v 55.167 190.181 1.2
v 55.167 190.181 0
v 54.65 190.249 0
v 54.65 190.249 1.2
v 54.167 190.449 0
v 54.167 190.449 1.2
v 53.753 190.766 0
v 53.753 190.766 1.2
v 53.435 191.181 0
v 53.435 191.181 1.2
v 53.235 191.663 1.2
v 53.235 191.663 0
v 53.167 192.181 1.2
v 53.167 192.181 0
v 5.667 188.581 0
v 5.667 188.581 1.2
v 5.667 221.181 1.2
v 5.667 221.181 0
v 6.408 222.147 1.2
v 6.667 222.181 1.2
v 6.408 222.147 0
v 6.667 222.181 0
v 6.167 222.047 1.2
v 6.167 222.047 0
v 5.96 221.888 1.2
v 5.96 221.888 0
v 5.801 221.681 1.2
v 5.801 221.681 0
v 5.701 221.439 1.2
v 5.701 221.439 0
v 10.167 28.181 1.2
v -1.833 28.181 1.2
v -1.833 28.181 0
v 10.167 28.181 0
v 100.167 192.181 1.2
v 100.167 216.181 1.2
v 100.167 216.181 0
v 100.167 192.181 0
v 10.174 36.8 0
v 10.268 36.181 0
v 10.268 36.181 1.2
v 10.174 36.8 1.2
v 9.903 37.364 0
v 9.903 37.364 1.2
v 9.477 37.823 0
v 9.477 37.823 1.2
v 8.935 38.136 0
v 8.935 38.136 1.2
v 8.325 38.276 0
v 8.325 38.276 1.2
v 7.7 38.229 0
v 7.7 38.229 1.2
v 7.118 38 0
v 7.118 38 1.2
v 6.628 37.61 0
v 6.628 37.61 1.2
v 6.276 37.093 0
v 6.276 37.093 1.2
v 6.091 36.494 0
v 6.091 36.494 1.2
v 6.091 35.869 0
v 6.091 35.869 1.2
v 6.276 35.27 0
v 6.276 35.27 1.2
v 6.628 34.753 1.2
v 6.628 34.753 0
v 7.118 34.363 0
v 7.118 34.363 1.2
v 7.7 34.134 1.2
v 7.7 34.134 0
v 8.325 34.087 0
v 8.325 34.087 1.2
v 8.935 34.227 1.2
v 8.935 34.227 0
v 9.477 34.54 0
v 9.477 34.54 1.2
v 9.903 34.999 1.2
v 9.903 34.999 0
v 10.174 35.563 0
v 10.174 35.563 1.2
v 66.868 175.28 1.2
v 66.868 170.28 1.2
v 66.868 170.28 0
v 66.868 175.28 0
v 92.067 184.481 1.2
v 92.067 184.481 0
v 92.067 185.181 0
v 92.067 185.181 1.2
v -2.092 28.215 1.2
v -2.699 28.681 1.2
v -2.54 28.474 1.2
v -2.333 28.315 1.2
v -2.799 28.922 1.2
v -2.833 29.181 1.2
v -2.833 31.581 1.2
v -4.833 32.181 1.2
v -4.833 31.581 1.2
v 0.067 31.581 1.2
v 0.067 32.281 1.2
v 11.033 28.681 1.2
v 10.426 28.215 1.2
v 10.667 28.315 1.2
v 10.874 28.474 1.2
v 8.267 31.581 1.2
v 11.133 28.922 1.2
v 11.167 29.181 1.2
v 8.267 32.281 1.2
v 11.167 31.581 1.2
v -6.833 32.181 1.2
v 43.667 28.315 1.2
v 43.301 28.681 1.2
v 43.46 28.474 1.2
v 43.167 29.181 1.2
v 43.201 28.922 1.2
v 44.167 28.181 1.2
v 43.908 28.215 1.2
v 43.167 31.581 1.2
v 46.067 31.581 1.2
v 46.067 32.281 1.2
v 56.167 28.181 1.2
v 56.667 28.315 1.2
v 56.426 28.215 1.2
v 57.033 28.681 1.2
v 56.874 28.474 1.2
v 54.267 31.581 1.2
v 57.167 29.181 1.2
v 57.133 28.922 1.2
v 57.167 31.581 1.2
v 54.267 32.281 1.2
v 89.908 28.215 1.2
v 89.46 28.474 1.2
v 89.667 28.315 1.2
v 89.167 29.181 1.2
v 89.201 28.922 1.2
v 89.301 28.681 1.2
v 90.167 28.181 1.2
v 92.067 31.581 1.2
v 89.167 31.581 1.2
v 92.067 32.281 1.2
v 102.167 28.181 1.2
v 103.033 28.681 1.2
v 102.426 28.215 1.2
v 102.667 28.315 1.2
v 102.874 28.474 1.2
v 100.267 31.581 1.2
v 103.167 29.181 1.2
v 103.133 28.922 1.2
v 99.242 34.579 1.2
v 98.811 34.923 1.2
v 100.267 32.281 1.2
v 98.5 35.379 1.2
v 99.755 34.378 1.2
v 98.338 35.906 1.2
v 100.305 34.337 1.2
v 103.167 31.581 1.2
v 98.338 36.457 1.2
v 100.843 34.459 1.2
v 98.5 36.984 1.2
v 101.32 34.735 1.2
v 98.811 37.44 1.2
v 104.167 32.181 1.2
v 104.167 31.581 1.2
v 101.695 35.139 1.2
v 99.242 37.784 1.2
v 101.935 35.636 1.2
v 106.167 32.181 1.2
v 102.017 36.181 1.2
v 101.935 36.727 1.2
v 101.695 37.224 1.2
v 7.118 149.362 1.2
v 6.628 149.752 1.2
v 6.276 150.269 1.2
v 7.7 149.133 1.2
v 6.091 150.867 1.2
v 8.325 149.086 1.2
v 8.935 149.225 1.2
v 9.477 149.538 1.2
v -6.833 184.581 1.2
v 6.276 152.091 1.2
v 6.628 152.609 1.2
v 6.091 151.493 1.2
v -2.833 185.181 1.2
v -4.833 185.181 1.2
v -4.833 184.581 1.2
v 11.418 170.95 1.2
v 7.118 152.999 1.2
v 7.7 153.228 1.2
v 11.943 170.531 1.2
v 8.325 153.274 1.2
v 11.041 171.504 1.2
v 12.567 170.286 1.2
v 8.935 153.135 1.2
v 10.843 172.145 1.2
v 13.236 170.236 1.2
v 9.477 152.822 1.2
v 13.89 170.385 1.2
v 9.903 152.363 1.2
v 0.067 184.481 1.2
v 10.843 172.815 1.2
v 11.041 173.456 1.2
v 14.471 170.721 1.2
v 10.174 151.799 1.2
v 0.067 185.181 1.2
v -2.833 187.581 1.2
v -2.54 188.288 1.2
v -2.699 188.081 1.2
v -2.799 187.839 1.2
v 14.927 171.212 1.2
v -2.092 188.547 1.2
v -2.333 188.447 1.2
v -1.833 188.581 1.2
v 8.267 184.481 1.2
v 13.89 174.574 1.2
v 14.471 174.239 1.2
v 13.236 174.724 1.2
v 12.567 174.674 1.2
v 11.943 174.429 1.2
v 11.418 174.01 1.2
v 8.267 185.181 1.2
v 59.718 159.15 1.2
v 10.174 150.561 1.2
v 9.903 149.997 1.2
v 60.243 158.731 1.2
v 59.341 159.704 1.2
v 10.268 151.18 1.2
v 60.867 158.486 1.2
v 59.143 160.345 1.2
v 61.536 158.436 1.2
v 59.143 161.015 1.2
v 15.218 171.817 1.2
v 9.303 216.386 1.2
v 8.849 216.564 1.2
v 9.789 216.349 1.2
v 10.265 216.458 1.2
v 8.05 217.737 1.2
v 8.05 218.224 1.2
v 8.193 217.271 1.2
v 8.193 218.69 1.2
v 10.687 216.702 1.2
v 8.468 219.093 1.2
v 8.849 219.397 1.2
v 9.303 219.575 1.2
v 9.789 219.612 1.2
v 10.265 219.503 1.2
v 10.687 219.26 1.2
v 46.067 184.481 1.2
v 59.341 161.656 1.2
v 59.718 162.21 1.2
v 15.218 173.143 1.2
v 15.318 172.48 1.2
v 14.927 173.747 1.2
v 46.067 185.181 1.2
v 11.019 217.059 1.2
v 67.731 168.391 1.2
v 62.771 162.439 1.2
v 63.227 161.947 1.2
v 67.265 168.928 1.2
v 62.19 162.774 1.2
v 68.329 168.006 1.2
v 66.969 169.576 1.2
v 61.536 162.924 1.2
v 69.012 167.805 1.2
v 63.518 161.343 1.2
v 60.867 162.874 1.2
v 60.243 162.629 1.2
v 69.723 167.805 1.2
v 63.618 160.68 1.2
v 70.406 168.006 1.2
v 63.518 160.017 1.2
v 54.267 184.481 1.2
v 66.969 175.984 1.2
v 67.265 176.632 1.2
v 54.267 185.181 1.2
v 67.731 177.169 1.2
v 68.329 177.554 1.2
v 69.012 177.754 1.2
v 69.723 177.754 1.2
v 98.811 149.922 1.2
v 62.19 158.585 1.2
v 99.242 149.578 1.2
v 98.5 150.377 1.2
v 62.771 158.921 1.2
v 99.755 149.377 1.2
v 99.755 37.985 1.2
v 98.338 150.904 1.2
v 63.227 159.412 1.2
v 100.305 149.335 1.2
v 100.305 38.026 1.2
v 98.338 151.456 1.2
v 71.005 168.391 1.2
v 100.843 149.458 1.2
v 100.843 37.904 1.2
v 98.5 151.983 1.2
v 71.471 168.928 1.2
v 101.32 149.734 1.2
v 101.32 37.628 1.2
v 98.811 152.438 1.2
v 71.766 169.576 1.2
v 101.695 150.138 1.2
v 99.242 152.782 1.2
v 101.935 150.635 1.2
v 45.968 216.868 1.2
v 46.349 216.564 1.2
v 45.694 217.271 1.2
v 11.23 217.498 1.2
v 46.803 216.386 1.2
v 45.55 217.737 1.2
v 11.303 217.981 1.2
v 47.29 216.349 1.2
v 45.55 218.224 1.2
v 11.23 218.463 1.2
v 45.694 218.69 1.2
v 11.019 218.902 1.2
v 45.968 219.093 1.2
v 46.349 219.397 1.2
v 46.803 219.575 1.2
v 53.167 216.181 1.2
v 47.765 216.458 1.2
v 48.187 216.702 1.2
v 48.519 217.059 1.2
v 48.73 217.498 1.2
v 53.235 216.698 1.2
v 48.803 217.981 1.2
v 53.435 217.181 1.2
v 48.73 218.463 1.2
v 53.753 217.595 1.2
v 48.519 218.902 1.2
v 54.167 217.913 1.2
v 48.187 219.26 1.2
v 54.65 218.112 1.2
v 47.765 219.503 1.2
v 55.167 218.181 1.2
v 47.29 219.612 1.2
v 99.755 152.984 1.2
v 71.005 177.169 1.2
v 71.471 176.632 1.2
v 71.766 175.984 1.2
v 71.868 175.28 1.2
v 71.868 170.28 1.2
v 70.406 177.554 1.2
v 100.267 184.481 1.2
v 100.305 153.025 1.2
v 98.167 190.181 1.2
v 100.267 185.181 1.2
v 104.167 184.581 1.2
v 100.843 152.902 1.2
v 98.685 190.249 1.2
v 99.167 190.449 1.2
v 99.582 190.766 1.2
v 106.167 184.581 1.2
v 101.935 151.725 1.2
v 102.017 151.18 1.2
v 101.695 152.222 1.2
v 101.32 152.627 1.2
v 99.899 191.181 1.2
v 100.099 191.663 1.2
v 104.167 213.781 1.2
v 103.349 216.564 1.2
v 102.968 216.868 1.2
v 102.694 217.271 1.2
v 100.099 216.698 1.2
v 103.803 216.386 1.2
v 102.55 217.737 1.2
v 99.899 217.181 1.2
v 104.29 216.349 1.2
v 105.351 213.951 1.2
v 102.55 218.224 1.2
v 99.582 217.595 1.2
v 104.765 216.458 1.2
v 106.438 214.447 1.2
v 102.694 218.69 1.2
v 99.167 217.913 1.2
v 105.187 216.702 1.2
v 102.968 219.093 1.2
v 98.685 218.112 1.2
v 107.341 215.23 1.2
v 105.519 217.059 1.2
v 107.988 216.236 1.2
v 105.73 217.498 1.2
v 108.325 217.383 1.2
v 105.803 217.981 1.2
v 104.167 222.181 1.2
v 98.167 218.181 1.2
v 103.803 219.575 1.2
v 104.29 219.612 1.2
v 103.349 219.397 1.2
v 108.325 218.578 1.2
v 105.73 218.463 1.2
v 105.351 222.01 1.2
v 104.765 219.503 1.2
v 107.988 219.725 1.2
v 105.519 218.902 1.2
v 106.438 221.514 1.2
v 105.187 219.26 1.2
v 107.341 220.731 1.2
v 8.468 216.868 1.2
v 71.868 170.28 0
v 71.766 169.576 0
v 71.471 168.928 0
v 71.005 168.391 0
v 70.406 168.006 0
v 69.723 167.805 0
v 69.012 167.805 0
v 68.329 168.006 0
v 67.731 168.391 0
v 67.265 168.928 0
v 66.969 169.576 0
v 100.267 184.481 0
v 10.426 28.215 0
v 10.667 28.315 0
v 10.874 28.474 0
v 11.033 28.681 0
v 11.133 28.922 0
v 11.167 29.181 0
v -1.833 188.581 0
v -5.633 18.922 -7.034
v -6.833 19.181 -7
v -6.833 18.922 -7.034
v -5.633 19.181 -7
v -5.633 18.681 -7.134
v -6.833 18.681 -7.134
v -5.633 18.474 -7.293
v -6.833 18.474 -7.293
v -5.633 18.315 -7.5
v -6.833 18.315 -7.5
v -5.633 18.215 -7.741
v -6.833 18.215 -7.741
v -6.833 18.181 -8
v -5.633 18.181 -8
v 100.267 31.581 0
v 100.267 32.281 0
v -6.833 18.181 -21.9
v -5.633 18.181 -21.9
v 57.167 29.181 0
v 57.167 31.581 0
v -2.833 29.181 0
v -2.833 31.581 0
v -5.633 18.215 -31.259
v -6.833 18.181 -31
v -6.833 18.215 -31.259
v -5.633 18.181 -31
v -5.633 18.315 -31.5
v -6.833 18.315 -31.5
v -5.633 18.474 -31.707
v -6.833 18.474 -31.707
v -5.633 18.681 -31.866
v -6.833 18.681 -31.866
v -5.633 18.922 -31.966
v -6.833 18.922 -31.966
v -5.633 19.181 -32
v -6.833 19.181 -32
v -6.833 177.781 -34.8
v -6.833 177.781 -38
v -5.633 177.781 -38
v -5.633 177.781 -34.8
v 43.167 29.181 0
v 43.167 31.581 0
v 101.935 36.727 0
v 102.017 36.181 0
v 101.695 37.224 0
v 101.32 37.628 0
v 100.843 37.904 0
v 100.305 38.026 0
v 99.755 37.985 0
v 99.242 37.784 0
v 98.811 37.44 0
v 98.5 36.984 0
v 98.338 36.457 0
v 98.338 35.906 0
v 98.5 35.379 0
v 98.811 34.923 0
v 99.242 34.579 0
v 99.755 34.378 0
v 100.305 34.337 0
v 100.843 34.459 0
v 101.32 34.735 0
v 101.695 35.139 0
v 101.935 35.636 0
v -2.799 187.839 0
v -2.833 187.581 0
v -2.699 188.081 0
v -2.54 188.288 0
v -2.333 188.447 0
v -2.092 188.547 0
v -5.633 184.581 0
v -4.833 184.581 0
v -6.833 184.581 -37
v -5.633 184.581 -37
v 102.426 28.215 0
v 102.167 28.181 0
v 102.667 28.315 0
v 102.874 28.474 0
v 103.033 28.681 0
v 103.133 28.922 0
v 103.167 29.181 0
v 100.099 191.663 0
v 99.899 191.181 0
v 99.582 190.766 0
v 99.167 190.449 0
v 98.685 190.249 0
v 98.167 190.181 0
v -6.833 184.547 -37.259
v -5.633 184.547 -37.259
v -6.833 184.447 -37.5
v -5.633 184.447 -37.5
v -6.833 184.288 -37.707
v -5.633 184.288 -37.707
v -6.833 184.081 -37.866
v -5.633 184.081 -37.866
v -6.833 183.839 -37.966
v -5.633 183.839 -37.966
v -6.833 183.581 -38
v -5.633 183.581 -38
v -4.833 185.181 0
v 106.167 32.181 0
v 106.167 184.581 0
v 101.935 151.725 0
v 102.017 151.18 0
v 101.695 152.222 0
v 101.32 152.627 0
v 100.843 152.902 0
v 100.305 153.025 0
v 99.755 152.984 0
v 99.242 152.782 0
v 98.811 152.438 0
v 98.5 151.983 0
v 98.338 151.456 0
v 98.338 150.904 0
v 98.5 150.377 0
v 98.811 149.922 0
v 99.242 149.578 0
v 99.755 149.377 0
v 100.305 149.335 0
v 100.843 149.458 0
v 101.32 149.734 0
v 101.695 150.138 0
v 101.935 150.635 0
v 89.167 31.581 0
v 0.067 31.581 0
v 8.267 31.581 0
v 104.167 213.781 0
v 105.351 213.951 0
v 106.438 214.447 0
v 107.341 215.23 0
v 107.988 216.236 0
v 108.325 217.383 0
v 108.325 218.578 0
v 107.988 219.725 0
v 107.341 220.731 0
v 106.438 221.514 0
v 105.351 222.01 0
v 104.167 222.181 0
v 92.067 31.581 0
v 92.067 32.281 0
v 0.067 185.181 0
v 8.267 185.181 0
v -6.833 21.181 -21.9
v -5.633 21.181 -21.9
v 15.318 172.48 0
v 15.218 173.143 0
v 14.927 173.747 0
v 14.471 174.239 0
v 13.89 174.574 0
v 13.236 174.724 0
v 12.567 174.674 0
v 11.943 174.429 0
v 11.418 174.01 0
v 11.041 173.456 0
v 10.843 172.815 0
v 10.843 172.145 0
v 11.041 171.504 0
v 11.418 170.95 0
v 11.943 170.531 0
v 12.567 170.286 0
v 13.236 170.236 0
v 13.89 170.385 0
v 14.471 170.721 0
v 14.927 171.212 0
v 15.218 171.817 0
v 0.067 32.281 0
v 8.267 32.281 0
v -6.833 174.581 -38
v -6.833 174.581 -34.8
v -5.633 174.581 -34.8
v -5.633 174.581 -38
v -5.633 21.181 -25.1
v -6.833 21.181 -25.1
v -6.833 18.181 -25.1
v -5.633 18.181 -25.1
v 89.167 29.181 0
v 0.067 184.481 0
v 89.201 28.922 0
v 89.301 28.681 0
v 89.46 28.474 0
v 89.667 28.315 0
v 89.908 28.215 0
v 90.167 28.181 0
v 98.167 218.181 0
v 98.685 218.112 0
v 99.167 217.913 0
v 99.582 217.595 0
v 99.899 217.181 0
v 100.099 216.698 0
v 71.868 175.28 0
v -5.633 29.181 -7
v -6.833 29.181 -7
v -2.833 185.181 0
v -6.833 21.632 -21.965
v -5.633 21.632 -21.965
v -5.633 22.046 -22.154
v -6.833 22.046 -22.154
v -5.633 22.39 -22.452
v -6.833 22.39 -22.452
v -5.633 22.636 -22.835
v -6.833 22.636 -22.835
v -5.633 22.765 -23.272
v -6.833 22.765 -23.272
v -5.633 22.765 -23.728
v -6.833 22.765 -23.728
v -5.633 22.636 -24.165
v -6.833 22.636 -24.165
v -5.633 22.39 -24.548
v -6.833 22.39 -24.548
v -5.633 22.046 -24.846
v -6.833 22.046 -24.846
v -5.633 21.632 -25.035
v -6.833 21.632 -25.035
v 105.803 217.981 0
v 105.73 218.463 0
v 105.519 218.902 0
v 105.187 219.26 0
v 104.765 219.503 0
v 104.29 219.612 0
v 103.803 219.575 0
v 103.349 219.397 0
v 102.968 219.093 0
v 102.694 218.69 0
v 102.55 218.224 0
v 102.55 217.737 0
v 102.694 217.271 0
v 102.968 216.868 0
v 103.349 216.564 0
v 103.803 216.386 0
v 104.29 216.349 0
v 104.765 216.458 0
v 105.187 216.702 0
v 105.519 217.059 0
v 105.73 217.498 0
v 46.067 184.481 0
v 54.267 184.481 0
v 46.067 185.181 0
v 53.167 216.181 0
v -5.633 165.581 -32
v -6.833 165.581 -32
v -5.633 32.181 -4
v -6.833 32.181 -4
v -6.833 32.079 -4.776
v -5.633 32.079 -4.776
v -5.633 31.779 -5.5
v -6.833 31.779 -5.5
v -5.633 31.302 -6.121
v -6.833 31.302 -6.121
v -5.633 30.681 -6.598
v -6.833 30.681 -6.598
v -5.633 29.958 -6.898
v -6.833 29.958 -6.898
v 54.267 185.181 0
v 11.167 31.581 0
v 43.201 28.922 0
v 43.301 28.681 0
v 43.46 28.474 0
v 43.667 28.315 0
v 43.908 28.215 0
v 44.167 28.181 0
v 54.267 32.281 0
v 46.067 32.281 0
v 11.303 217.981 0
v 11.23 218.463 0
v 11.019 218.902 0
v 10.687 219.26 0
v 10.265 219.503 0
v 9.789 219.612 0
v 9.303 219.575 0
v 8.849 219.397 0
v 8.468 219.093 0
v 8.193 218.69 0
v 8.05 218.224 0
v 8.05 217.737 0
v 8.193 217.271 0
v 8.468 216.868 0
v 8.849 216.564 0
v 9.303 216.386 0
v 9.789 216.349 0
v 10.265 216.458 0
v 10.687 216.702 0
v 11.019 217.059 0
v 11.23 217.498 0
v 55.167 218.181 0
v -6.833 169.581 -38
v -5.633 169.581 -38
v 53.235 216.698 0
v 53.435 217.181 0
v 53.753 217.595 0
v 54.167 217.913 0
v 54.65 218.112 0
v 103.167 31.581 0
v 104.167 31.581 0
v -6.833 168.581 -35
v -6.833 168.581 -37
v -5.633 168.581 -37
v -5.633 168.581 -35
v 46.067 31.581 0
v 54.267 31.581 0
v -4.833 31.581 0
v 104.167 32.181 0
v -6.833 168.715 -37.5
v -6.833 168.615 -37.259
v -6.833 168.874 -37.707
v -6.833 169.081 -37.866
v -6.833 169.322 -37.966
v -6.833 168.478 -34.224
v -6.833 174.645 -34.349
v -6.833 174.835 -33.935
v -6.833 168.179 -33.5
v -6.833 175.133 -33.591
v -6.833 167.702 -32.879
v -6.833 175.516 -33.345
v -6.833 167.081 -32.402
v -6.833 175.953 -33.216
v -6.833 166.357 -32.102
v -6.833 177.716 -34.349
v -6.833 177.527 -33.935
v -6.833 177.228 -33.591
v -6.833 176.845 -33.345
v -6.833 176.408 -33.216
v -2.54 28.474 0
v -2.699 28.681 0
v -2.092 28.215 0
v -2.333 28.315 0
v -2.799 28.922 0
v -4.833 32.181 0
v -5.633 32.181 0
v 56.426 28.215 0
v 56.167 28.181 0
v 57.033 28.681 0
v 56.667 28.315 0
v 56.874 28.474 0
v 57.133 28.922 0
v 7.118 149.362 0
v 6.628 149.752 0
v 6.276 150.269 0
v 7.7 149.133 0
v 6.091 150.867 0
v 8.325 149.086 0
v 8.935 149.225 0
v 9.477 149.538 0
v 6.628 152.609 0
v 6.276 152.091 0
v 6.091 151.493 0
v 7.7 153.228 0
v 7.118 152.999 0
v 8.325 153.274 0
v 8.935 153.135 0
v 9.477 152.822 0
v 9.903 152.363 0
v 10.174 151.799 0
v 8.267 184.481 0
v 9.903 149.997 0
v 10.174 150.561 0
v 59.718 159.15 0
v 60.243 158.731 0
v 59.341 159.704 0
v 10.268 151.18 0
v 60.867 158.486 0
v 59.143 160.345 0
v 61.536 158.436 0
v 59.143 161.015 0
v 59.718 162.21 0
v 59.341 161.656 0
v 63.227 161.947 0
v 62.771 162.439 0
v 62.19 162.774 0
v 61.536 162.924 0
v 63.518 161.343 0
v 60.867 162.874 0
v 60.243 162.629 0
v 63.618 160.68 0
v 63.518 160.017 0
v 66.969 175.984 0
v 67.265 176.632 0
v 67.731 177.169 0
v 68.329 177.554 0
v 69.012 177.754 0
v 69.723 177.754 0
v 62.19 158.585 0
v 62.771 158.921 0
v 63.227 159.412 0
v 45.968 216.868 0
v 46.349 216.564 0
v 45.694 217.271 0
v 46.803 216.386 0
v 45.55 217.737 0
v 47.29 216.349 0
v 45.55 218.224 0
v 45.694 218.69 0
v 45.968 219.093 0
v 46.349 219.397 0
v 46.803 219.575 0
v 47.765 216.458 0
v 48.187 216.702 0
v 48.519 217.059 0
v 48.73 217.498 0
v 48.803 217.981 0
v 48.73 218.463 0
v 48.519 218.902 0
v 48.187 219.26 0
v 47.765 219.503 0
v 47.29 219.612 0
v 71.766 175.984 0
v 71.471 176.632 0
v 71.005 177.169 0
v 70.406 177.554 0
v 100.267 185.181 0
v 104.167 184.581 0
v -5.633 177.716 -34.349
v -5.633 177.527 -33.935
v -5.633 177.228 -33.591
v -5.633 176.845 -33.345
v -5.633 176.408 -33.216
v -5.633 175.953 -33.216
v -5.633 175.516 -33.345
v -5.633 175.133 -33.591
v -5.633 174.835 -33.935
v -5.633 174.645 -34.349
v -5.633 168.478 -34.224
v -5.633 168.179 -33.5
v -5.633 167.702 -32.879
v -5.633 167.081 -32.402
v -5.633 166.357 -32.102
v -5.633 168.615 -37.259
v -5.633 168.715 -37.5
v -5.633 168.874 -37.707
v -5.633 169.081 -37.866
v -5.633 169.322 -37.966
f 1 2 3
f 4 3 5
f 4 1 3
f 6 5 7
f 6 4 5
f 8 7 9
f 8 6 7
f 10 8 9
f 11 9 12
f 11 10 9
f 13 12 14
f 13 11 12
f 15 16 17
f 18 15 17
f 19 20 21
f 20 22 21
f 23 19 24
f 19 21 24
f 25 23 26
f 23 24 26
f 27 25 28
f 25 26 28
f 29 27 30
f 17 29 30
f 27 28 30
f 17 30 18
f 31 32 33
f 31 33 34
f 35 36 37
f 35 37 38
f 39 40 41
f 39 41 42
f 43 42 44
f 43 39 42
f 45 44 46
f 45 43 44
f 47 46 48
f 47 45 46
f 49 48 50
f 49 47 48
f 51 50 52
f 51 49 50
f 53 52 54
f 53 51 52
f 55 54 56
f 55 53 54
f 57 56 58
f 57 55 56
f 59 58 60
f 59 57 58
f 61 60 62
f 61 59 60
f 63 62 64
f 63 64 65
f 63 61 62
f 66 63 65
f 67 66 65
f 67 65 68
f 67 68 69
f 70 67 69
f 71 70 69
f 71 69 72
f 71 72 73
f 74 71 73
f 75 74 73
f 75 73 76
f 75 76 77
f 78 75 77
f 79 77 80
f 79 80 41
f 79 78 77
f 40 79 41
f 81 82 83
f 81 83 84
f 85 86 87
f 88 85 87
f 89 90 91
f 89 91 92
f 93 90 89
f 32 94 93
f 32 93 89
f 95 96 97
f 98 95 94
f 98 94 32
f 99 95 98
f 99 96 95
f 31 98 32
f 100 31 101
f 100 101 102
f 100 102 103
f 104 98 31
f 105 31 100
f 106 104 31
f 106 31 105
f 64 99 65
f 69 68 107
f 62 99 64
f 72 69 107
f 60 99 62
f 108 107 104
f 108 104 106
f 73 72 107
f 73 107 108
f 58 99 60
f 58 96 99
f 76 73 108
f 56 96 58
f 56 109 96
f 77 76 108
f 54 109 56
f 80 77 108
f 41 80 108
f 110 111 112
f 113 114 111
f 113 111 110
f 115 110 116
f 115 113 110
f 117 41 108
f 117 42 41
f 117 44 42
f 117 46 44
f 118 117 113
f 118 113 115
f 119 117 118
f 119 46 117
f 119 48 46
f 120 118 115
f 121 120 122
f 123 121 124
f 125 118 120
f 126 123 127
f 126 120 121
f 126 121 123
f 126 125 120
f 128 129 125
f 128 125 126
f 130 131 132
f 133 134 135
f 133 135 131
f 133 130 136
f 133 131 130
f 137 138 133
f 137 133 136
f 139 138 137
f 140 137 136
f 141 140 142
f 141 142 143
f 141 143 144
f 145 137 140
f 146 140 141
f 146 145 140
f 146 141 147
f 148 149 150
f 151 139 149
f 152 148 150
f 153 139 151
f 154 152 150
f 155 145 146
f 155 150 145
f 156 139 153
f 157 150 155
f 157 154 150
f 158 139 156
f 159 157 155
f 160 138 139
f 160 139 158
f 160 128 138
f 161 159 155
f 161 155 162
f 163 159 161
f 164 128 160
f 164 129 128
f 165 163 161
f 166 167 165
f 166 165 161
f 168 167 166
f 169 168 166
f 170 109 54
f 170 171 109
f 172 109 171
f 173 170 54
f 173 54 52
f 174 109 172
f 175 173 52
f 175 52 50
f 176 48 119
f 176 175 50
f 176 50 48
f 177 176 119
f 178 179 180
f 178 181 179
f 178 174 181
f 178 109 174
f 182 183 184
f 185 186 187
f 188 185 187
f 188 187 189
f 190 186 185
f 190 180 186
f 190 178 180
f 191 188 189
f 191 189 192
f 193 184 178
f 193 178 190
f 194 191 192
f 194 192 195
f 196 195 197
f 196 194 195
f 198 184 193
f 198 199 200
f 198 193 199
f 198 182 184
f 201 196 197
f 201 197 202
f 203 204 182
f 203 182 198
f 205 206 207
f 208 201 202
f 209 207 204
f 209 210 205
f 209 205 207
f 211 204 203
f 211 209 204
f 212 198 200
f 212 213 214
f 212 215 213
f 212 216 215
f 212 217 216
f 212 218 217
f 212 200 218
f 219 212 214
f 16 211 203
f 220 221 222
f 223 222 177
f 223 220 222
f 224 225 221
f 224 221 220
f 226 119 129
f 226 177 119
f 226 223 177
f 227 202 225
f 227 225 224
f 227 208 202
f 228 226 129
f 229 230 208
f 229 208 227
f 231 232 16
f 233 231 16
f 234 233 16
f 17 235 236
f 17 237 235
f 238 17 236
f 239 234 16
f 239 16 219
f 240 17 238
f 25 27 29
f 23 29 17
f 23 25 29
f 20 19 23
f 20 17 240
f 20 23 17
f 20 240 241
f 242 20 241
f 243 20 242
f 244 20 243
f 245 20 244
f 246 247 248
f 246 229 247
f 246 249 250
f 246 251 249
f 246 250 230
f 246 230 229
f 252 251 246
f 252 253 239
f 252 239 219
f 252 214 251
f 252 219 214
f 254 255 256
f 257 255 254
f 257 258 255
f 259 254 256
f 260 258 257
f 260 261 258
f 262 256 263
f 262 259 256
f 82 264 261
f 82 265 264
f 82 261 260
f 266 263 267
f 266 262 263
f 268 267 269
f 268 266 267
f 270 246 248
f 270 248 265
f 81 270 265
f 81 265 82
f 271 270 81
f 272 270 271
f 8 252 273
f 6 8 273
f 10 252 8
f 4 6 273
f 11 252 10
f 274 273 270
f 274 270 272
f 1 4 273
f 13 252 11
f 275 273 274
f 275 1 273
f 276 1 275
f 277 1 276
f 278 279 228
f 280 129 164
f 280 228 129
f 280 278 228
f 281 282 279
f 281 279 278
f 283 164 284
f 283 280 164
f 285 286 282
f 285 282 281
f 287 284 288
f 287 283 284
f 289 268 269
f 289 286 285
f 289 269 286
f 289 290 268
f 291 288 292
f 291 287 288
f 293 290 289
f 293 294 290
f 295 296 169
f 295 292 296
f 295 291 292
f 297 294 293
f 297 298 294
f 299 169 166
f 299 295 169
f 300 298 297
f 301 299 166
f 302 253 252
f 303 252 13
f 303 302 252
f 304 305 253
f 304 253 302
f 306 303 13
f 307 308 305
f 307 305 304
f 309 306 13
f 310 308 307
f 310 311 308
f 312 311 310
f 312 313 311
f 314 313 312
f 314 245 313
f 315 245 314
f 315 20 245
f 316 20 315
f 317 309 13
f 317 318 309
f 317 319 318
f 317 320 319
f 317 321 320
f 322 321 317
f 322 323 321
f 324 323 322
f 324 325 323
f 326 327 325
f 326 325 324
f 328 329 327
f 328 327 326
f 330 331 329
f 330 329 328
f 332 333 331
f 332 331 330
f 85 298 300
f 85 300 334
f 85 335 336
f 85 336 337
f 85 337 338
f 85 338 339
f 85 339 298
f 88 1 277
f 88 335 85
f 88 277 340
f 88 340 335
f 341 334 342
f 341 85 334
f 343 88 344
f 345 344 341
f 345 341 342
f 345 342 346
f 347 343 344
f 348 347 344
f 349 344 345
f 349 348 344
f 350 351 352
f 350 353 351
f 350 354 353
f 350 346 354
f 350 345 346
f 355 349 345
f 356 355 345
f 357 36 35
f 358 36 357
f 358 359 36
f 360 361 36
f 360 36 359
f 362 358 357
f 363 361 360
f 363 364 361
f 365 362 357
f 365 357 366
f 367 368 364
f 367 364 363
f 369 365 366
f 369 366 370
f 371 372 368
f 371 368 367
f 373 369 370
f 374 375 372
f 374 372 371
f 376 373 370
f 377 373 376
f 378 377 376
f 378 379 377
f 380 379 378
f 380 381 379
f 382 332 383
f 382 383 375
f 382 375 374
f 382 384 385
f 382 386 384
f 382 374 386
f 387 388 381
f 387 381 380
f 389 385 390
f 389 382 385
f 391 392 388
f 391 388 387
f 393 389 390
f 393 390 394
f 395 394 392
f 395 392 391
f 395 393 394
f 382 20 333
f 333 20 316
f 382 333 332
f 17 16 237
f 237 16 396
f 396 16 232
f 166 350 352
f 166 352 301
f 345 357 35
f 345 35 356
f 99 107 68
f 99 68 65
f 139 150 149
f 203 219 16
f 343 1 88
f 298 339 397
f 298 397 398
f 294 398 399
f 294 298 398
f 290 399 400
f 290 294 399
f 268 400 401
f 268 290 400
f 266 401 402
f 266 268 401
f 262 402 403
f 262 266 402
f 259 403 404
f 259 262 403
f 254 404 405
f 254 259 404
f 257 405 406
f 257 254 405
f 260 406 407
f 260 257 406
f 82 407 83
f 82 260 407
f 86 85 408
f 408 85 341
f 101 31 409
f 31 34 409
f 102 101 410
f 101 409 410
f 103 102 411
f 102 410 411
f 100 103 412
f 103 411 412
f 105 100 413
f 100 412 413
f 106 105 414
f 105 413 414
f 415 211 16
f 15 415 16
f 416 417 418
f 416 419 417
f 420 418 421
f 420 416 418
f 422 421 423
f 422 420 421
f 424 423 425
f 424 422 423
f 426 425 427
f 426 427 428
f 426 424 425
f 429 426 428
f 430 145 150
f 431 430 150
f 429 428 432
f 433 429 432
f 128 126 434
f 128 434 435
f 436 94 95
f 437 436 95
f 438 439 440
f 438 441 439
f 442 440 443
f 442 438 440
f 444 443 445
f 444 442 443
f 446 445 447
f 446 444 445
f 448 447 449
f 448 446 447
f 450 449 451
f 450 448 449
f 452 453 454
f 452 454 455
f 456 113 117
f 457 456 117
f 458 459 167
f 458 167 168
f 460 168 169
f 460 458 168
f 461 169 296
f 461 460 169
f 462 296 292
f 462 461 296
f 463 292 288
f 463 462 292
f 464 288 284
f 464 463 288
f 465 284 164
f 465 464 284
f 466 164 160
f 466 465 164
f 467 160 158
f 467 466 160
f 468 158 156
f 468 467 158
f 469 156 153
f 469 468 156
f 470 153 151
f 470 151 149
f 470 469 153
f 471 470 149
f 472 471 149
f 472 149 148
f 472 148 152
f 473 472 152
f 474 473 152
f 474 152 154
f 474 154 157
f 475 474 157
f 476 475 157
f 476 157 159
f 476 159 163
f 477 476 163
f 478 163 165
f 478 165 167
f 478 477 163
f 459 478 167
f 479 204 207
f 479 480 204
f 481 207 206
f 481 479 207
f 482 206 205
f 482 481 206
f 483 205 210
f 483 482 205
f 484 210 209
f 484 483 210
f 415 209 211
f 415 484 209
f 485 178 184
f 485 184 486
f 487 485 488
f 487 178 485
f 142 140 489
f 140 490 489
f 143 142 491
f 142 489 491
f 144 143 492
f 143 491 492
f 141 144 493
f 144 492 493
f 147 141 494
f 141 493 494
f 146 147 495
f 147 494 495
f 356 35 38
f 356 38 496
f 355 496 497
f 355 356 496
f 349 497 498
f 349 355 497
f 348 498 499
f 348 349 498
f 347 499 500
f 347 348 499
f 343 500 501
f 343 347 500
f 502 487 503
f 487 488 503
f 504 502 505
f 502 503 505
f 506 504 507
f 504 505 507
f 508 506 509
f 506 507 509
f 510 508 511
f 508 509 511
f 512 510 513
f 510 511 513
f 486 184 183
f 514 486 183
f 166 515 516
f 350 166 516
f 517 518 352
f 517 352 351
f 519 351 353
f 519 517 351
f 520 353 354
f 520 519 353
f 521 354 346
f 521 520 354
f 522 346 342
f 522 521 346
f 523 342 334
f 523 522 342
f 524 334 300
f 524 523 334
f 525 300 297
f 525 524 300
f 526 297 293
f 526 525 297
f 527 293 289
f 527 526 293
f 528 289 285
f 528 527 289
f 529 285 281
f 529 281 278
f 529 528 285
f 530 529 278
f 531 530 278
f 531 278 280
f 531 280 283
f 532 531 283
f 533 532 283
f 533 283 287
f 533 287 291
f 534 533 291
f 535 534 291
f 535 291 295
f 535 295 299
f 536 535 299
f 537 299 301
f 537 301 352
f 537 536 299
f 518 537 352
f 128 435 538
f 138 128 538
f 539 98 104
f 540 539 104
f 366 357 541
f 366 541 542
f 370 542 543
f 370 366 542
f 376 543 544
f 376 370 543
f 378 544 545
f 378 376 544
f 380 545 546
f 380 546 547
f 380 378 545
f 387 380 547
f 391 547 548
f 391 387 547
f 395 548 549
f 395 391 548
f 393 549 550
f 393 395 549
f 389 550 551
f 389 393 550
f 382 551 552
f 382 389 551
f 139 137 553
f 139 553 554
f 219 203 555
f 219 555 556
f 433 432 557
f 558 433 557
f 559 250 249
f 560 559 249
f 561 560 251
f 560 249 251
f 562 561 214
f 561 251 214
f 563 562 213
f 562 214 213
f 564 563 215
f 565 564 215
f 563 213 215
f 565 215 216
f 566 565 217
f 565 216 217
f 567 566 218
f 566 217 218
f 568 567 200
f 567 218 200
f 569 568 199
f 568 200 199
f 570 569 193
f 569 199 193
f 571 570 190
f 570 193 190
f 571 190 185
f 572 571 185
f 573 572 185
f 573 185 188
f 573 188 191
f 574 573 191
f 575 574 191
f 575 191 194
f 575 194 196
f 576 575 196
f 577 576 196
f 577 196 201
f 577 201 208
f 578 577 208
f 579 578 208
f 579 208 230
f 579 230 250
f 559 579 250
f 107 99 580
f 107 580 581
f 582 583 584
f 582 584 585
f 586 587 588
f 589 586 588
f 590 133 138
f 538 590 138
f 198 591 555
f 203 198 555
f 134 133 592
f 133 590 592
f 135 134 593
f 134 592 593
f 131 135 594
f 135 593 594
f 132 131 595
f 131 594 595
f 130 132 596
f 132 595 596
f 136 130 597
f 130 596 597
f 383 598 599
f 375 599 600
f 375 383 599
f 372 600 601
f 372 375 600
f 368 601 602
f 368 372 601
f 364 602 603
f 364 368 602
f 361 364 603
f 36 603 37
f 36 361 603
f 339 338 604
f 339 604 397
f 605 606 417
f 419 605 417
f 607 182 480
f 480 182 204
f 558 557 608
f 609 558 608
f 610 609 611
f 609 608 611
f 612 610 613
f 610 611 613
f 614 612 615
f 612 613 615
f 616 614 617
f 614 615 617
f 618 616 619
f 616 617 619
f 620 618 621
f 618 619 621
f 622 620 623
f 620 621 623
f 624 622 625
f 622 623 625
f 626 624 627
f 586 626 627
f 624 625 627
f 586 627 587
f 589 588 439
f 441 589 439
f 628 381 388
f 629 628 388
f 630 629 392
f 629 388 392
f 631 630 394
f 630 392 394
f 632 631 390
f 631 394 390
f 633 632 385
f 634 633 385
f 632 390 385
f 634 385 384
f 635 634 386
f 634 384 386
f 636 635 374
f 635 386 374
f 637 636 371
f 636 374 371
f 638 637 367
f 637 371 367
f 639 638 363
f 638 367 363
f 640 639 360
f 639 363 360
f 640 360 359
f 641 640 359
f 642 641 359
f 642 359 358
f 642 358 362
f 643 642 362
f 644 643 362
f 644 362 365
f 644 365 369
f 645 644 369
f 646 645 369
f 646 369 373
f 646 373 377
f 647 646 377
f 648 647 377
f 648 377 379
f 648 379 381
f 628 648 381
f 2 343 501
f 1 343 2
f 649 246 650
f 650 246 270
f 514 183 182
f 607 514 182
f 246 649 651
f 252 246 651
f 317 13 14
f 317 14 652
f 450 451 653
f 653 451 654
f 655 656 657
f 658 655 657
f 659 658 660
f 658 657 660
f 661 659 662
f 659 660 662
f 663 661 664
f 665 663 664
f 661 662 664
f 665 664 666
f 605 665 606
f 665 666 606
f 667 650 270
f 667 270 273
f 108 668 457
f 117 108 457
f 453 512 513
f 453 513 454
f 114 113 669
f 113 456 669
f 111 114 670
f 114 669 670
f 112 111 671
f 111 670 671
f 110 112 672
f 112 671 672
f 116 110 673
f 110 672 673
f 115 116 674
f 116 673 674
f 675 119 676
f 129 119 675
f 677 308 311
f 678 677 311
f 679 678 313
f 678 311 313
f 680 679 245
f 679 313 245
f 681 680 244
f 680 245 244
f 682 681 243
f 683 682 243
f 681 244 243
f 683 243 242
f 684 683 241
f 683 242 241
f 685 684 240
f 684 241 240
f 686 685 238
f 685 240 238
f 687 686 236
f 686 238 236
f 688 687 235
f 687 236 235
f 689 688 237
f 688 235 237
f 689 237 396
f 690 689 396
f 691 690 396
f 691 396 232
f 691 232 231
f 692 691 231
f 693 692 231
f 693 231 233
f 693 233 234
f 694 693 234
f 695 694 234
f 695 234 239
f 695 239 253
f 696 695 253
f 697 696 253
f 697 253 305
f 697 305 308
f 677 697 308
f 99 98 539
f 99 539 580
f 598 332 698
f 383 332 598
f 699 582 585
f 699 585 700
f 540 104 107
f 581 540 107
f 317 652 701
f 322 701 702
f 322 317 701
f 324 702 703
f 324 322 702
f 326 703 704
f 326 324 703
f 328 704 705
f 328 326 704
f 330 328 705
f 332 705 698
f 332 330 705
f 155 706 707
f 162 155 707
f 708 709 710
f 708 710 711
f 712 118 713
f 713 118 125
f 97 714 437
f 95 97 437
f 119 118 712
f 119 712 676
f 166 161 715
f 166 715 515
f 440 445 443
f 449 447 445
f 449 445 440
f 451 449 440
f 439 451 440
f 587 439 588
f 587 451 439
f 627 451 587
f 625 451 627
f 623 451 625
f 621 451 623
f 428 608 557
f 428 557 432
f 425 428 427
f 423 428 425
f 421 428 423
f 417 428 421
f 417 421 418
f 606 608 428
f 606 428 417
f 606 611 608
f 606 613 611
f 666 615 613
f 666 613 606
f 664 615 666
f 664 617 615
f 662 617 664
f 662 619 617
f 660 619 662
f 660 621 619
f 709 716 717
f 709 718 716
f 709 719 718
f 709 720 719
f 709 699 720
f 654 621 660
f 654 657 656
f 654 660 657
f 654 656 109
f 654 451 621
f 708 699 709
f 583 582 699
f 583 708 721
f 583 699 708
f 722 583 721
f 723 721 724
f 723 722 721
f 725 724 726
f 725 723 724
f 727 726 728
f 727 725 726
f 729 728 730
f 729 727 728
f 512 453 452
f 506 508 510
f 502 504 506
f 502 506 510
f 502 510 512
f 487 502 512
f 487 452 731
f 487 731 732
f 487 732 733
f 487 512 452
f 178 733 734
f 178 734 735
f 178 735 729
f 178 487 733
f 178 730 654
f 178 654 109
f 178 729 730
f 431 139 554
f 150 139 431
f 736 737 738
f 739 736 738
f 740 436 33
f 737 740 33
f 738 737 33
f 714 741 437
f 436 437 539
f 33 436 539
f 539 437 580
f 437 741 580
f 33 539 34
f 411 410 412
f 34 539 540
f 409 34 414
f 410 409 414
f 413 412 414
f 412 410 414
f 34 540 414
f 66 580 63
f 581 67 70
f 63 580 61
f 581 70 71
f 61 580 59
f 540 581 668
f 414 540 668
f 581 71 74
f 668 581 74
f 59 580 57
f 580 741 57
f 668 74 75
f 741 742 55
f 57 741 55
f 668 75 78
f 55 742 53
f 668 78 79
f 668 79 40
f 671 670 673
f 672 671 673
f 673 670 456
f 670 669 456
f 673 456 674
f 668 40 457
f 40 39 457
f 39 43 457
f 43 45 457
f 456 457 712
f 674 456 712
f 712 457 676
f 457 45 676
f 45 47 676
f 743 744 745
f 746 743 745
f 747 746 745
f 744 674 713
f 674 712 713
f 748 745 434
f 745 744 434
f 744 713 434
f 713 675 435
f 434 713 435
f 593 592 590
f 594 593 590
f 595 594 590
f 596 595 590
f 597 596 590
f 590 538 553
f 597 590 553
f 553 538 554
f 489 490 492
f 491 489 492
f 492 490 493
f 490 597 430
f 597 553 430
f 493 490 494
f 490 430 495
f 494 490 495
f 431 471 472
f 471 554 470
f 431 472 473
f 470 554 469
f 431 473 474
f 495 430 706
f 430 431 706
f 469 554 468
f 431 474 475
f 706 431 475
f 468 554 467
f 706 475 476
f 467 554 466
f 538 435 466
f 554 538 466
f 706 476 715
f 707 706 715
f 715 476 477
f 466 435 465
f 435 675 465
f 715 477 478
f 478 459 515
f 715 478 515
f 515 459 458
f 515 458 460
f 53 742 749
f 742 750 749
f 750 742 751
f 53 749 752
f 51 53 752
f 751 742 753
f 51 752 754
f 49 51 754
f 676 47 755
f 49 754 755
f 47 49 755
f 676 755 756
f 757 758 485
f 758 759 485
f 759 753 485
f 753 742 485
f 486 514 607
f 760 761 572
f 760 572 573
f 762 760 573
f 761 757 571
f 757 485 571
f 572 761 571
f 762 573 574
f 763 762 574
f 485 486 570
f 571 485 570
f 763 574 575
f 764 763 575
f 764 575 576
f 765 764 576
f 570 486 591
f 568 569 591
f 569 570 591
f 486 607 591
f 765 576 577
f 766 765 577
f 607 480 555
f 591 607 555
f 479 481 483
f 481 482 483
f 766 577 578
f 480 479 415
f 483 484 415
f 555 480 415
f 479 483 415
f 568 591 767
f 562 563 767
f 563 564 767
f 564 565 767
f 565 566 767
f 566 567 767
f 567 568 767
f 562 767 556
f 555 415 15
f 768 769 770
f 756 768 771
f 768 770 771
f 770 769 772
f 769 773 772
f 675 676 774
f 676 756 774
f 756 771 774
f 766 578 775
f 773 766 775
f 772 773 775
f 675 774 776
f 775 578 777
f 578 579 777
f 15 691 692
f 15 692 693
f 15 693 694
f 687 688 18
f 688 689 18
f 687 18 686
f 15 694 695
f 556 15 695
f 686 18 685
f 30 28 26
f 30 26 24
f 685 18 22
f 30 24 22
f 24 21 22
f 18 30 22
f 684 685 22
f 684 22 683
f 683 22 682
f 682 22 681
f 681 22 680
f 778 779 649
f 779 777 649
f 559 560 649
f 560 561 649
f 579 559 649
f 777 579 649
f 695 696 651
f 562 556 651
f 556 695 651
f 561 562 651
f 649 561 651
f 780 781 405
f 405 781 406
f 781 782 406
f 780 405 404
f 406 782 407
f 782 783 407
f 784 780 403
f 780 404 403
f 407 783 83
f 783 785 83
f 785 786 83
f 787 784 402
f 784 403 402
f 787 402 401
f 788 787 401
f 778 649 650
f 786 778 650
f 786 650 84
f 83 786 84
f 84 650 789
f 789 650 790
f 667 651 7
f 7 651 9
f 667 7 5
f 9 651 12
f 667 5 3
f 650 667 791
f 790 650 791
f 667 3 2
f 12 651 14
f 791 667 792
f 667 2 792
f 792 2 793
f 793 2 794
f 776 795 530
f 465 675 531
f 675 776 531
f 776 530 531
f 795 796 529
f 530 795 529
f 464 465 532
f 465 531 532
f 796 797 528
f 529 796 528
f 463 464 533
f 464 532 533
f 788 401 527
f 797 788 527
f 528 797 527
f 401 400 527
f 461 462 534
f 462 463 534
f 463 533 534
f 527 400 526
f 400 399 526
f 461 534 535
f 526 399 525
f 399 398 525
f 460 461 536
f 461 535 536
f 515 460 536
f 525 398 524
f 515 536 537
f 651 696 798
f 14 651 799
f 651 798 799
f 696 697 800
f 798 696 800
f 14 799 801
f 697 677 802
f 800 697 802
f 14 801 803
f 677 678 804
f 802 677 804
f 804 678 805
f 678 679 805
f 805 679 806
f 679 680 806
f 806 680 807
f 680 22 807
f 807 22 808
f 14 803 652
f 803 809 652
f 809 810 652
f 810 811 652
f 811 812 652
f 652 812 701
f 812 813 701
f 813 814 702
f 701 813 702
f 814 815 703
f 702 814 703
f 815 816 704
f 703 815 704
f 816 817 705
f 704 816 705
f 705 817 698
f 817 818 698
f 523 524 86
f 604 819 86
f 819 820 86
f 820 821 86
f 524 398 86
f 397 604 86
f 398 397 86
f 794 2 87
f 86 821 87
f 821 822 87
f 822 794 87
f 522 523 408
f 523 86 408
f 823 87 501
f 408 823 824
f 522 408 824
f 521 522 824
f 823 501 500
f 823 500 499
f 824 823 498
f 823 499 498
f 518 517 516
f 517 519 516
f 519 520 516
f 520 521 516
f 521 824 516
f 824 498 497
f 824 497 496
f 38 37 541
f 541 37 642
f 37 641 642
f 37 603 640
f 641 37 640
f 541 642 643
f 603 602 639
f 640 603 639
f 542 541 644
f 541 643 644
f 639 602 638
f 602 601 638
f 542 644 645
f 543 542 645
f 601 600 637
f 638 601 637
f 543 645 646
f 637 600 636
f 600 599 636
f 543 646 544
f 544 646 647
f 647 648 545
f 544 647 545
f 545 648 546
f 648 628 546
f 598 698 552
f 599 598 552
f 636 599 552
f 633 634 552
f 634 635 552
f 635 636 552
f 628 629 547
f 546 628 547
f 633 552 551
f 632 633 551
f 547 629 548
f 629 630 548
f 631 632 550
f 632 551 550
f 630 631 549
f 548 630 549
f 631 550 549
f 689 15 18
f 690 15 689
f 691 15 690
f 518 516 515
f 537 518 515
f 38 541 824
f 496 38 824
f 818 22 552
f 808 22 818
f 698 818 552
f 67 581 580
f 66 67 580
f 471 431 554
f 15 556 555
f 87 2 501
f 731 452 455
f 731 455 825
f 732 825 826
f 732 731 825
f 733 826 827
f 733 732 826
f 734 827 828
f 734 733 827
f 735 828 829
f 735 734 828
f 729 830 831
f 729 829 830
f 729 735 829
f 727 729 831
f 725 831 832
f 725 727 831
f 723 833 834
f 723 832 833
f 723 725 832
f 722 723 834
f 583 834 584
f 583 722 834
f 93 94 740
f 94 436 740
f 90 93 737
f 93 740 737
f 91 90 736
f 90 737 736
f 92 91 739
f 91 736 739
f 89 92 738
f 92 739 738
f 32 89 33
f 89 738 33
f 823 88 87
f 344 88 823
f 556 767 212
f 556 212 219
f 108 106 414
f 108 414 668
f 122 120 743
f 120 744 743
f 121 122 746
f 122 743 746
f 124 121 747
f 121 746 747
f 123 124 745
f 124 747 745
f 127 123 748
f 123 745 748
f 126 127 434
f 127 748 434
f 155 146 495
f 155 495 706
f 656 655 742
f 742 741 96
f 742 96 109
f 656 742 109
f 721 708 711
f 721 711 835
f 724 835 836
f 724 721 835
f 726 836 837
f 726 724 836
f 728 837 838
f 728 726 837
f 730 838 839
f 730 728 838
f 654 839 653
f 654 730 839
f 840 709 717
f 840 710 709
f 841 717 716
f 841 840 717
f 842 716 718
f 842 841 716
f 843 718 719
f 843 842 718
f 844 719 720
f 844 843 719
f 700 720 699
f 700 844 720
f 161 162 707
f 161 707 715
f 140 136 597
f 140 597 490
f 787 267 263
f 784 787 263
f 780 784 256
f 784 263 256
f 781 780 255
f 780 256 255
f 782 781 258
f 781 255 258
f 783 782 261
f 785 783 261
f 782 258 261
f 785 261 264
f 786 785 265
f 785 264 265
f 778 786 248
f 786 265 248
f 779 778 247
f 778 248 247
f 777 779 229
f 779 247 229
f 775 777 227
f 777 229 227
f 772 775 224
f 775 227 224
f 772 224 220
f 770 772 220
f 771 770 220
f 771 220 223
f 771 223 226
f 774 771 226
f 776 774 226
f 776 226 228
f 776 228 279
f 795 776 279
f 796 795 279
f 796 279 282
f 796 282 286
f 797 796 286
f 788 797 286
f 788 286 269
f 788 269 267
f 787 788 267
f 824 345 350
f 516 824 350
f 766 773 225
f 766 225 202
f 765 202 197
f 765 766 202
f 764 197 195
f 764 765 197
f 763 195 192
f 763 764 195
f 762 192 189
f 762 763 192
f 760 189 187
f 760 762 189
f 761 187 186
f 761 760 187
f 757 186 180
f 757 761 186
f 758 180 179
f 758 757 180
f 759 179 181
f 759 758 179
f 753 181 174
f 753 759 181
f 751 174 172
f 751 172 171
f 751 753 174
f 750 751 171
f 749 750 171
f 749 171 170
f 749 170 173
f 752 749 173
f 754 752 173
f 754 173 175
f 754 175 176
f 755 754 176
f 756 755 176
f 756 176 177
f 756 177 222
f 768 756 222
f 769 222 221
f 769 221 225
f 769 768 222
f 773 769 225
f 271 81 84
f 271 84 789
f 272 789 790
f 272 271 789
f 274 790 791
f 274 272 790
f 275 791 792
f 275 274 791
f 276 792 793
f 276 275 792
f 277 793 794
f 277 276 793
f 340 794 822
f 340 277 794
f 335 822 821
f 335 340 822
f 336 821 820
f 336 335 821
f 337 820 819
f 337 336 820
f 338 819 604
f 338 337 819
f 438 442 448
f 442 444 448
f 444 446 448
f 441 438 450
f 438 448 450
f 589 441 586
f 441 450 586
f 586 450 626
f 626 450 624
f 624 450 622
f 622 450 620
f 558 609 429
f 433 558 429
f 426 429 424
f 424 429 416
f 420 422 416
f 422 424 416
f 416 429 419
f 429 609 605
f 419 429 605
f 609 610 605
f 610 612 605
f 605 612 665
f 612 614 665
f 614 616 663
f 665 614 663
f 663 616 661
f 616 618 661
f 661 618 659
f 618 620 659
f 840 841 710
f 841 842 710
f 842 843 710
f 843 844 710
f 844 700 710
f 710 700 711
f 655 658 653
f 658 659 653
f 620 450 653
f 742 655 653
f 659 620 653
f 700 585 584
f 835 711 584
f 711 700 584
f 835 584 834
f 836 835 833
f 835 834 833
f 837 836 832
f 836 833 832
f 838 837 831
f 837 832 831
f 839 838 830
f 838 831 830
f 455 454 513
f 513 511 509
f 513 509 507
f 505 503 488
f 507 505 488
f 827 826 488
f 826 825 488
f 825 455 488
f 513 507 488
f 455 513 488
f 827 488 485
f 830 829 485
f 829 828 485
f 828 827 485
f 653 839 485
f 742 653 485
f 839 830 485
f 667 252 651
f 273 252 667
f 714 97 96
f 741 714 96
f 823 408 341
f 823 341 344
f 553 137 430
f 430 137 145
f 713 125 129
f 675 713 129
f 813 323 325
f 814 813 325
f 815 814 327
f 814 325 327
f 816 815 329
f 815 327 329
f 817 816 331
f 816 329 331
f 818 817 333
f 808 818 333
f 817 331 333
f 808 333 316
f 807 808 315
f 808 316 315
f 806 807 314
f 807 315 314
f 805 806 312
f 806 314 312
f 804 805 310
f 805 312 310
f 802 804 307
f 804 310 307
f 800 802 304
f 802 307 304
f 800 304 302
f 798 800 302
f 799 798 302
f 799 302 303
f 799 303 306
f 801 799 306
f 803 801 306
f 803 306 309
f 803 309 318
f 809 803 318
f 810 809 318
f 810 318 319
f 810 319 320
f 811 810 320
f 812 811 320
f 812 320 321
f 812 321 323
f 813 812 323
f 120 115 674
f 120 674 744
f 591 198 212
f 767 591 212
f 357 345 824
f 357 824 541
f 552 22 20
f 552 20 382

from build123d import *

# Parameters (mm, degrees)
SKETCH2_W           = 113.00010125
SKETCH2_H           = 190.5995575
SKETCH2_R           = 2.1
SKETCH2_R_2         = 1.85
BOSS_EXTRUDE1_DEPTH = 1.2
SKETCH5_W           = 2
SKETCH5_H           = 37.6
SKETCH5_H_2         = 0.6
CUT_EXTRUDE2_DEPTH  = 2.2
CUT_EXTRUDE1_DEPTH  = 2.2
SKETCH9_W           = 14
SKETCH9_H           = 3.4
SKETCH9_W_2         = 8.5
BOSS_EXTRUDE5_DEPTH = 1.2
FILLET1_R           = 1
CUT_EXTRUDE4_REACH  = 3.2
SKETCH10_W          = 8.2
SKETCH10_H          = 0.7
SKETCH11_R          = 2.25
CUT_EXTRUDE5_DEPTH  = 2.2
BOSS_EXTRUDE6_DEPTH = 1.2
SKETCH13_R          = 1.635773904
CUT_EXTRUDE6_DEPTH  = 2.2
SKETCH14_W          = 1.2
SKETCH14_H          = 152.3995575
BOSS_EXTRUDE7_DEPTH = 32
BOSS_EXTRUDE8_DEPTH = 1.2
BOSS_EXTRUDE9_DEPTH = 1.2
CUT_EXTRUDE7_REACH  = 117.2
FILLET2_R           = 1


with BuildPart() as part:
    # Sketch2 → Boss-Extrude1 (new body)
    with BuildSketch(Plane.XY):
        with Locations((49.667238625, 126.88082875)):
            Rectangle(SKETCH2_W, SKETCH2_H)
        with Locations((8.16763175, 151.180160625)):
            Circle(SKETCH2_R, mode=Mode.SUBTRACT)
        with Locations((100.1668405, 151.180160625)):
            Circle(SKETCH2_R_2, mode=Mode.SUBTRACT)
        with Locations((100.1668405, 36.181495)):
            Circle(SKETCH2_R_2, mode=Mode.SUBTRACT)
        with Locations((8.16763175, 36.181495)):
            Circle(SKETCH2_R, mode=Mode.SUBTRACT)
    extrude(amount=BOSS_EXTRUDE1_DEPTH)

    # Sketch5 → Cut-Extrude2 (cut, through all)
    with BuildSketch(Plane.XY.offset(1.2)):
        Polygon((-4.832812, 185.1806075), (5.667188, 185.1806075), (5.667188, 222.1806075), (-6.832812, 222.1806075), (-6.832812, 185.1806075), (-6.832812, 184.5806075), (-4.832812, 184.5806075), align=None)
        with Locations((105.16728925, 203.3806075)):
            Rectangle(SKETCH5_W, SKETCH5_H)
        with Locations((-5.832812, 31.88105)):
            Rectangle(SKETCH5_W, SKETCH5_H_2)
        with Locations((105.16728925, 31.88105)):
            Rectangle(SKETCH5_W, SKETCH5_H_2)
    extrude(amount=-CUT_EXTRUDE2_DEPTH, mode=Mode.SUBTRACT)

    # Sketch4 → Cut-Extrude1 (cut, through all)
    with BuildSketch(Plane.XY.offset(1.2)):
        with BuildLine():
            Line((55.16728925, 218.1806075), (98.16728925, 218.1806075))
            ThreePointArc((98.16728925, 218.1806075), (99.581502812, 217.594821062), (100.16728925, 216.1806075))
            Line((100.16728925, 216.1806075), (100.16728925, 192.1806075))
            ThreePointArc((100.16728925, 192.1806075), (99.581502812, 190.766393938), (98.16728925, 190.1806075))
            Line((98.16728925, 190.1806075), (55.16728925, 190.1806075))
            ThreePointArc((55.16728925, 190.1806075), (53.753075688, 190.766393938), (53.16728925, 192.1806075))
            Line((53.16728925, 192.1806075), (53.16728925, 216.1806075))
            ThreePointArc((53.16728925, 216.1806075), (53.753075688, 217.594821062), (55.16728925, 218.1806075))
        make_face()
    extrude(amount=-CUT_EXTRUDE1_DEPTH, mode=Mode.SUBTRACT)

    # Sketch9 → Boss-Extrude5 (add)
    with BuildSketch(Plane.XY.offset(1.2)):
        with Locations((4.167188, 29.88105)):
            Rectangle(SKETCH9_W, SKETCH9_H)
        with Locations((96.16728925, 29.88105)):
            Rectangle(SKETCH9_W, SKETCH9_H)
        with Locations((50.167238625, 29.88105)):
            Rectangle(SKETCH9_W, SKETCH9_H)
        with Locations((1.417188, 186.8806075)):
            Rectangle(SKETCH9_W_2, SKETCH9_H)
    extrude(amount=-BOSS_EXTRUDE5_DEPTH)

    # Fillet1
    fillet1_edges = [part.edges().sort_by_distance(p)[0] for p in [
        (103.16728925, 28.18105, 0.6),
        (89.16728925, 28.18105, 0.6),
        (57.167238625, 28.18105, 0.6),
        (43.167238625, 28.18105, 0.6),
        (11.167188, 28.18105, 0.6),
        (-2.832812, 28.18105, 0.6),
        (-2.832812, 188.5806075, 0.6),
    ]]
    fillet(fillet1_edges, radius=FILLET1_R)

    # Sketch10 → Cut-Extrude4 (cut, up to next)
    with BuildSketch(Plane.XY.offset(1.2), mode=Mode.PRIVATE) as cut_extrude4_sk1:
        with Locations((96.16728925, 31.93105)):
            Rectangle(SKETCH10_W, SKETCH10_H)
    cut_extrude4_tool1 = extrude(cut_extrude4_sk1.sketch, amount=-CUT_EXTRUDE4_REACH, mode=Mode.PRIVATE) & part.part
    add(cut_extrude4_tool1.solids().sort_by_distance((96.167289, 31.93105, 1.2))[0], mode=Mode.SUBTRACT)
    # Sketch10 → Cut-Extrude4 (cut, up to next)
    with BuildSketch(Plane.XY.offset(1.2), mode=Mode.PRIVATE) as cut_extrude4_sk2:
        with Locations((50.167238625, 31.93105)):
            Rectangle(SKETCH10_W, SKETCH10_H)
    cut_extrude4_tool2 = extrude(cut_extrude4_sk2.sketch, amount=-CUT_EXTRUDE4_REACH, mode=Mode.PRIVATE) & part.part
    add(cut_extrude4_tool2.solids().sort_by_distance((50.167239, 31.93105, 1.2))[0], mode=Mode.SUBTRACT)
    # Sketch10 → Cut-Extrude4 (cut, up to next)
    with BuildSketch(Plane.XY.offset(1.2), mode=Mode.PRIVATE) as cut_extrude4_sk3:
        with Locations((4.167188, 31.93105)):
            Rectangle(SKETCH10_W, SKETCH10_H)
    cut_extrude4_tool3 = extrude(cut_extrude4_sk3.sketch, amount=-CUT_EXTRUDE4_REACH, mode=Mode.PRIVATE) & part.part
    add(cut_extrude4_tool3.solids().sort_by_distance((4.167188, 31.93105, 1.2))[0], mode=Mode.SUBTRACT)
    # Sketch10 → Cut-Extrude4 (cut, up to next)
    with BuildSketch(Plane.XY.offset(1.2), mode=Mode.PRIVATE) as cut_extrude4_sk4:
        with Locations((50.167238625, 184.8306075)):
            Rectangle(SKETCH10_W, SKETCH10_H)
    cut_extrude4_tool4 = extrude(cut_extrude4_sk4.sketch, amount=-CUT_EXTRUDE4_REACH, mode=Mode.PRIVATE) & part.part
    add(cut_extrude4_tool4.solids().sort_by_distance((50.167239, 184.830607, 1.2))[0], mode=Mode.SUBTRACT)
    # Sketch10 → Cut-Extrude4 (cut, up to next)
    with BuildSketch(Plane.XY.offset(1.2), mode=Mode.PRIVATE) as cut_extrude4_sk5:
        with Locations((96.16728925, 184.8306075)):
            Rectangle(SKETCH10_W, SKETCH10_H)
    cut_extrude4_tool5 = extrude(cut_extrude4_sk5.sketch, amount=-CUT_EXTRUDE4_REACH, mode=Mode.PRIVATE) & part.part
    add(cut_extrude4_tool5.solids().sort_by_distance((96.167289, 184.830607, 1.2))[0], mode=Mode.SUBTRACT)
    # Sketch10 → Cut-Extrude4 (cut, up to next)
    with BuildSketch(Plane.XY.offset(1.2), mode=Mode.PRIVATE) as cut_extrude4_sk6:
        with Locations((4.167188, 184.8306075)):
            Rectangle(SKETCH10_W, SKETCH10_H)
    cut_extrude4_tool6 = extrude(cut_extrude4_sk6.sketch, amount=-CUT_EXTRUDE4_REACH, mode=Mode.PRIVATE) & part.part
    add(cut_extrude4_tool6.solids().sort_by_distance((4.167188, 184.830607, 1.2))[0], mode=Mode.SUBTRACT)

    # Sketch11 → Cut-Extrude5 (cut, through all)
    with BuildSketch(Plane.XY.offset(1.2)):
        with Locations((61.367697375, 160.67994375)):
            Circle(SKETCH11_R)
        with Locations((13.067697375, 172.47994375)):
            Circle(SKETCH11_R)
        with BuildLine():
            Line((71.867697375, 175.27994375), (71.867697375, 170.27994375))
            ThreePointArc((71.867697375, 170.27994375), (69.367697375, 167.77994375), (66.867697375, 170.27994375))
            Line((66.867697375, 170.27994375), (66.867697375, 175.27994375))
            ThreePointArc((66.867697375, 175.27994375), (69.367697375, 177.77994375), (71.867697375, 175.27994375))
        make_face()
    extrude(amount=-CUT_EXTRUDE5_DEPTH, mode=Mode.SUBTRACT)

    # Sketch12 → Boss-Extrude6 (add)
    with BuildSketch(Plane.XY.offset(1.2)):
        with BuildLine():
            Line((104.16728925, 222.1806075), (104.16728925, 213.7806075))
            ThreePointArc((104.16728925, 213.7806075), (108.36728925, 217.9806075), (104.16728925, 222.1806075))
        make_face()
    extrude(amount=-BOSS_EXTRUDE6_DEPTH)

    # Sketch13 → Cut-Extrude6 (cut, through all)
    with BuildSketch(Plane.XY.offset(1.2)):
        with Locations((104.16728925, 217.9806075)):
            Circle(SKETCH13_R)
        with Locations((47.16728925, 217.9806075)):
            Circle(SKETCH13_R)
        with Locations((9.667188, 217.9806075)):
            Circle(SKETCH13_R)
    extrude(amount=-CUT_EXTRUDE6_DEPTH, mode=Mode.SUBTRACT)

    # Sketch14 → Boss-Extrude7 (add)
    with BuildSketch(Plane(origin=(0, 0, 0), x_dir=(-1, 0, 0), z_dir=(0, 0, -1))):
        with Locations((6.232812, 108.38082875)):
            Rectangle(SKETCH14_W, SKETCH14_H)
    extrude(amount=BOSS_EXTRUDE7_DEPTH)

    # Sketch16 → Boss-Extrude8 (add)
    with BuildSketch(Plane.ZY.offset(6.832812)):
        with BuildLine():
            Line((-32, 32.18105), (-4, 32.18105))
            ThreePointArc((-4, 32.18105), (-6.121320344, 31.302370344), (-7, 29.18105))
            Line((-7, 29.18105), (-7, 18.18105))
            Line((-7, 18.18105), (-32, 18.18105))
            Line((-32, 18.18105), (-32, 32.18105))
        make_face()
    extrude(amount=-BOSS_EXTRUDE8_DEPTH)

    # Sketch17 → Boss-Extrude9 (add)
    with BuildSketch(Plane.ZY.offset(6.832812)):
        with BuildLine():
            Line((-32, 184.5806075), (-38, 184.5806075))
            Line((-38, 184.5806075), (-38, 168.5806075))
            Line((-38, 168.5806075), (-35, 168.5806075))
            ThreePointArc((-35, 168.5806075), (-32.878679656, 167.701927844), (-32, 165.5806075))
            Line((-32, 165.5806075), (-32, 184.5806075))
        make_face()
    extrude(amount=-BOSS_EXTRUDE9_DEPTH)

    # Sketch15 → Cut-Extrude7 (cut, up to next)
    with BuildSketch(Plane.ZY.offset(6.832812), mode=Mode.PRIVATE) as cut_extrude7_sk1:
        with BuildLine():
            Line((-46.8, 177.7806075), (-34.8, 177.7806075))
            ThreePointArc((-34.8, 177.7806075), (-33.2, 176.1806075), (-34.8, 174.5806075))
            Line((-34.8, 174.5806075), (-46.8, 174.5806075))
            ThreePointArc((-46.8, 174.5806075), (-48.4, 176.1806075), (-46.8, 177.7806075))
        make_face()
    cut_extrude7_tool1 = extrude(cut_extrude7_sk1.sketch, amount=-CUT_EXTRUDE7_REACH, mode=Mode.PRIVATE) & part.part
    add(cut_extrude7_tool1.solids().sort_by_distance((-6.832812, 176.180608, -40.8))[0], mode=Mode.SUBTRACT)
    # Sketch15 → Cut-Extrude7 (cut, up to next)
    with BuildSketch(Plane.ZY.offset(6.832812), mode=Mode.PRIVATE) as cut_extrude7_sk2:
        with BuildLine():
            Line((-25.1, 21.18105), (-25.1, 18.18105))
            Line((-25.1, 18.18105), (-21.9, 18.18105))
            Line((-21.9, 18.18105), (-21.9, 21.18105))
            ThreePointArc((-21.9, 21.18105), (-23.5, 22.78105), (-25.1, 21.18105))
        make_face()
    cut_extrude7_tool2 = extrude(cut_extrude7_sk2.sketch, amount=-CUT_EXTRUDE7_REACH, mode=Mode.PRIVATE) & part.part
    add(cut_extrude7_tool2.solids().sort_by_distance((-6.832812, 20.324349, -23.5))[0], mode=Mode.SUBTRACT)

    # Fillet2
    fillet2_edges = [part.edges().sort_by_distance(p)[0] for p in [
        (5.667188, 222.1806075, 0.6),
        (-6.232812, 18.18105, -32),
        (-6.232812, 18.18105, -7),
        (-6.232812, 168.5806075, -38),
        (-6.232812, 184.5806075, -38),
    ]]
    fillet(fillet2_edges, radius=FILLET2_R)


solid = part.part
